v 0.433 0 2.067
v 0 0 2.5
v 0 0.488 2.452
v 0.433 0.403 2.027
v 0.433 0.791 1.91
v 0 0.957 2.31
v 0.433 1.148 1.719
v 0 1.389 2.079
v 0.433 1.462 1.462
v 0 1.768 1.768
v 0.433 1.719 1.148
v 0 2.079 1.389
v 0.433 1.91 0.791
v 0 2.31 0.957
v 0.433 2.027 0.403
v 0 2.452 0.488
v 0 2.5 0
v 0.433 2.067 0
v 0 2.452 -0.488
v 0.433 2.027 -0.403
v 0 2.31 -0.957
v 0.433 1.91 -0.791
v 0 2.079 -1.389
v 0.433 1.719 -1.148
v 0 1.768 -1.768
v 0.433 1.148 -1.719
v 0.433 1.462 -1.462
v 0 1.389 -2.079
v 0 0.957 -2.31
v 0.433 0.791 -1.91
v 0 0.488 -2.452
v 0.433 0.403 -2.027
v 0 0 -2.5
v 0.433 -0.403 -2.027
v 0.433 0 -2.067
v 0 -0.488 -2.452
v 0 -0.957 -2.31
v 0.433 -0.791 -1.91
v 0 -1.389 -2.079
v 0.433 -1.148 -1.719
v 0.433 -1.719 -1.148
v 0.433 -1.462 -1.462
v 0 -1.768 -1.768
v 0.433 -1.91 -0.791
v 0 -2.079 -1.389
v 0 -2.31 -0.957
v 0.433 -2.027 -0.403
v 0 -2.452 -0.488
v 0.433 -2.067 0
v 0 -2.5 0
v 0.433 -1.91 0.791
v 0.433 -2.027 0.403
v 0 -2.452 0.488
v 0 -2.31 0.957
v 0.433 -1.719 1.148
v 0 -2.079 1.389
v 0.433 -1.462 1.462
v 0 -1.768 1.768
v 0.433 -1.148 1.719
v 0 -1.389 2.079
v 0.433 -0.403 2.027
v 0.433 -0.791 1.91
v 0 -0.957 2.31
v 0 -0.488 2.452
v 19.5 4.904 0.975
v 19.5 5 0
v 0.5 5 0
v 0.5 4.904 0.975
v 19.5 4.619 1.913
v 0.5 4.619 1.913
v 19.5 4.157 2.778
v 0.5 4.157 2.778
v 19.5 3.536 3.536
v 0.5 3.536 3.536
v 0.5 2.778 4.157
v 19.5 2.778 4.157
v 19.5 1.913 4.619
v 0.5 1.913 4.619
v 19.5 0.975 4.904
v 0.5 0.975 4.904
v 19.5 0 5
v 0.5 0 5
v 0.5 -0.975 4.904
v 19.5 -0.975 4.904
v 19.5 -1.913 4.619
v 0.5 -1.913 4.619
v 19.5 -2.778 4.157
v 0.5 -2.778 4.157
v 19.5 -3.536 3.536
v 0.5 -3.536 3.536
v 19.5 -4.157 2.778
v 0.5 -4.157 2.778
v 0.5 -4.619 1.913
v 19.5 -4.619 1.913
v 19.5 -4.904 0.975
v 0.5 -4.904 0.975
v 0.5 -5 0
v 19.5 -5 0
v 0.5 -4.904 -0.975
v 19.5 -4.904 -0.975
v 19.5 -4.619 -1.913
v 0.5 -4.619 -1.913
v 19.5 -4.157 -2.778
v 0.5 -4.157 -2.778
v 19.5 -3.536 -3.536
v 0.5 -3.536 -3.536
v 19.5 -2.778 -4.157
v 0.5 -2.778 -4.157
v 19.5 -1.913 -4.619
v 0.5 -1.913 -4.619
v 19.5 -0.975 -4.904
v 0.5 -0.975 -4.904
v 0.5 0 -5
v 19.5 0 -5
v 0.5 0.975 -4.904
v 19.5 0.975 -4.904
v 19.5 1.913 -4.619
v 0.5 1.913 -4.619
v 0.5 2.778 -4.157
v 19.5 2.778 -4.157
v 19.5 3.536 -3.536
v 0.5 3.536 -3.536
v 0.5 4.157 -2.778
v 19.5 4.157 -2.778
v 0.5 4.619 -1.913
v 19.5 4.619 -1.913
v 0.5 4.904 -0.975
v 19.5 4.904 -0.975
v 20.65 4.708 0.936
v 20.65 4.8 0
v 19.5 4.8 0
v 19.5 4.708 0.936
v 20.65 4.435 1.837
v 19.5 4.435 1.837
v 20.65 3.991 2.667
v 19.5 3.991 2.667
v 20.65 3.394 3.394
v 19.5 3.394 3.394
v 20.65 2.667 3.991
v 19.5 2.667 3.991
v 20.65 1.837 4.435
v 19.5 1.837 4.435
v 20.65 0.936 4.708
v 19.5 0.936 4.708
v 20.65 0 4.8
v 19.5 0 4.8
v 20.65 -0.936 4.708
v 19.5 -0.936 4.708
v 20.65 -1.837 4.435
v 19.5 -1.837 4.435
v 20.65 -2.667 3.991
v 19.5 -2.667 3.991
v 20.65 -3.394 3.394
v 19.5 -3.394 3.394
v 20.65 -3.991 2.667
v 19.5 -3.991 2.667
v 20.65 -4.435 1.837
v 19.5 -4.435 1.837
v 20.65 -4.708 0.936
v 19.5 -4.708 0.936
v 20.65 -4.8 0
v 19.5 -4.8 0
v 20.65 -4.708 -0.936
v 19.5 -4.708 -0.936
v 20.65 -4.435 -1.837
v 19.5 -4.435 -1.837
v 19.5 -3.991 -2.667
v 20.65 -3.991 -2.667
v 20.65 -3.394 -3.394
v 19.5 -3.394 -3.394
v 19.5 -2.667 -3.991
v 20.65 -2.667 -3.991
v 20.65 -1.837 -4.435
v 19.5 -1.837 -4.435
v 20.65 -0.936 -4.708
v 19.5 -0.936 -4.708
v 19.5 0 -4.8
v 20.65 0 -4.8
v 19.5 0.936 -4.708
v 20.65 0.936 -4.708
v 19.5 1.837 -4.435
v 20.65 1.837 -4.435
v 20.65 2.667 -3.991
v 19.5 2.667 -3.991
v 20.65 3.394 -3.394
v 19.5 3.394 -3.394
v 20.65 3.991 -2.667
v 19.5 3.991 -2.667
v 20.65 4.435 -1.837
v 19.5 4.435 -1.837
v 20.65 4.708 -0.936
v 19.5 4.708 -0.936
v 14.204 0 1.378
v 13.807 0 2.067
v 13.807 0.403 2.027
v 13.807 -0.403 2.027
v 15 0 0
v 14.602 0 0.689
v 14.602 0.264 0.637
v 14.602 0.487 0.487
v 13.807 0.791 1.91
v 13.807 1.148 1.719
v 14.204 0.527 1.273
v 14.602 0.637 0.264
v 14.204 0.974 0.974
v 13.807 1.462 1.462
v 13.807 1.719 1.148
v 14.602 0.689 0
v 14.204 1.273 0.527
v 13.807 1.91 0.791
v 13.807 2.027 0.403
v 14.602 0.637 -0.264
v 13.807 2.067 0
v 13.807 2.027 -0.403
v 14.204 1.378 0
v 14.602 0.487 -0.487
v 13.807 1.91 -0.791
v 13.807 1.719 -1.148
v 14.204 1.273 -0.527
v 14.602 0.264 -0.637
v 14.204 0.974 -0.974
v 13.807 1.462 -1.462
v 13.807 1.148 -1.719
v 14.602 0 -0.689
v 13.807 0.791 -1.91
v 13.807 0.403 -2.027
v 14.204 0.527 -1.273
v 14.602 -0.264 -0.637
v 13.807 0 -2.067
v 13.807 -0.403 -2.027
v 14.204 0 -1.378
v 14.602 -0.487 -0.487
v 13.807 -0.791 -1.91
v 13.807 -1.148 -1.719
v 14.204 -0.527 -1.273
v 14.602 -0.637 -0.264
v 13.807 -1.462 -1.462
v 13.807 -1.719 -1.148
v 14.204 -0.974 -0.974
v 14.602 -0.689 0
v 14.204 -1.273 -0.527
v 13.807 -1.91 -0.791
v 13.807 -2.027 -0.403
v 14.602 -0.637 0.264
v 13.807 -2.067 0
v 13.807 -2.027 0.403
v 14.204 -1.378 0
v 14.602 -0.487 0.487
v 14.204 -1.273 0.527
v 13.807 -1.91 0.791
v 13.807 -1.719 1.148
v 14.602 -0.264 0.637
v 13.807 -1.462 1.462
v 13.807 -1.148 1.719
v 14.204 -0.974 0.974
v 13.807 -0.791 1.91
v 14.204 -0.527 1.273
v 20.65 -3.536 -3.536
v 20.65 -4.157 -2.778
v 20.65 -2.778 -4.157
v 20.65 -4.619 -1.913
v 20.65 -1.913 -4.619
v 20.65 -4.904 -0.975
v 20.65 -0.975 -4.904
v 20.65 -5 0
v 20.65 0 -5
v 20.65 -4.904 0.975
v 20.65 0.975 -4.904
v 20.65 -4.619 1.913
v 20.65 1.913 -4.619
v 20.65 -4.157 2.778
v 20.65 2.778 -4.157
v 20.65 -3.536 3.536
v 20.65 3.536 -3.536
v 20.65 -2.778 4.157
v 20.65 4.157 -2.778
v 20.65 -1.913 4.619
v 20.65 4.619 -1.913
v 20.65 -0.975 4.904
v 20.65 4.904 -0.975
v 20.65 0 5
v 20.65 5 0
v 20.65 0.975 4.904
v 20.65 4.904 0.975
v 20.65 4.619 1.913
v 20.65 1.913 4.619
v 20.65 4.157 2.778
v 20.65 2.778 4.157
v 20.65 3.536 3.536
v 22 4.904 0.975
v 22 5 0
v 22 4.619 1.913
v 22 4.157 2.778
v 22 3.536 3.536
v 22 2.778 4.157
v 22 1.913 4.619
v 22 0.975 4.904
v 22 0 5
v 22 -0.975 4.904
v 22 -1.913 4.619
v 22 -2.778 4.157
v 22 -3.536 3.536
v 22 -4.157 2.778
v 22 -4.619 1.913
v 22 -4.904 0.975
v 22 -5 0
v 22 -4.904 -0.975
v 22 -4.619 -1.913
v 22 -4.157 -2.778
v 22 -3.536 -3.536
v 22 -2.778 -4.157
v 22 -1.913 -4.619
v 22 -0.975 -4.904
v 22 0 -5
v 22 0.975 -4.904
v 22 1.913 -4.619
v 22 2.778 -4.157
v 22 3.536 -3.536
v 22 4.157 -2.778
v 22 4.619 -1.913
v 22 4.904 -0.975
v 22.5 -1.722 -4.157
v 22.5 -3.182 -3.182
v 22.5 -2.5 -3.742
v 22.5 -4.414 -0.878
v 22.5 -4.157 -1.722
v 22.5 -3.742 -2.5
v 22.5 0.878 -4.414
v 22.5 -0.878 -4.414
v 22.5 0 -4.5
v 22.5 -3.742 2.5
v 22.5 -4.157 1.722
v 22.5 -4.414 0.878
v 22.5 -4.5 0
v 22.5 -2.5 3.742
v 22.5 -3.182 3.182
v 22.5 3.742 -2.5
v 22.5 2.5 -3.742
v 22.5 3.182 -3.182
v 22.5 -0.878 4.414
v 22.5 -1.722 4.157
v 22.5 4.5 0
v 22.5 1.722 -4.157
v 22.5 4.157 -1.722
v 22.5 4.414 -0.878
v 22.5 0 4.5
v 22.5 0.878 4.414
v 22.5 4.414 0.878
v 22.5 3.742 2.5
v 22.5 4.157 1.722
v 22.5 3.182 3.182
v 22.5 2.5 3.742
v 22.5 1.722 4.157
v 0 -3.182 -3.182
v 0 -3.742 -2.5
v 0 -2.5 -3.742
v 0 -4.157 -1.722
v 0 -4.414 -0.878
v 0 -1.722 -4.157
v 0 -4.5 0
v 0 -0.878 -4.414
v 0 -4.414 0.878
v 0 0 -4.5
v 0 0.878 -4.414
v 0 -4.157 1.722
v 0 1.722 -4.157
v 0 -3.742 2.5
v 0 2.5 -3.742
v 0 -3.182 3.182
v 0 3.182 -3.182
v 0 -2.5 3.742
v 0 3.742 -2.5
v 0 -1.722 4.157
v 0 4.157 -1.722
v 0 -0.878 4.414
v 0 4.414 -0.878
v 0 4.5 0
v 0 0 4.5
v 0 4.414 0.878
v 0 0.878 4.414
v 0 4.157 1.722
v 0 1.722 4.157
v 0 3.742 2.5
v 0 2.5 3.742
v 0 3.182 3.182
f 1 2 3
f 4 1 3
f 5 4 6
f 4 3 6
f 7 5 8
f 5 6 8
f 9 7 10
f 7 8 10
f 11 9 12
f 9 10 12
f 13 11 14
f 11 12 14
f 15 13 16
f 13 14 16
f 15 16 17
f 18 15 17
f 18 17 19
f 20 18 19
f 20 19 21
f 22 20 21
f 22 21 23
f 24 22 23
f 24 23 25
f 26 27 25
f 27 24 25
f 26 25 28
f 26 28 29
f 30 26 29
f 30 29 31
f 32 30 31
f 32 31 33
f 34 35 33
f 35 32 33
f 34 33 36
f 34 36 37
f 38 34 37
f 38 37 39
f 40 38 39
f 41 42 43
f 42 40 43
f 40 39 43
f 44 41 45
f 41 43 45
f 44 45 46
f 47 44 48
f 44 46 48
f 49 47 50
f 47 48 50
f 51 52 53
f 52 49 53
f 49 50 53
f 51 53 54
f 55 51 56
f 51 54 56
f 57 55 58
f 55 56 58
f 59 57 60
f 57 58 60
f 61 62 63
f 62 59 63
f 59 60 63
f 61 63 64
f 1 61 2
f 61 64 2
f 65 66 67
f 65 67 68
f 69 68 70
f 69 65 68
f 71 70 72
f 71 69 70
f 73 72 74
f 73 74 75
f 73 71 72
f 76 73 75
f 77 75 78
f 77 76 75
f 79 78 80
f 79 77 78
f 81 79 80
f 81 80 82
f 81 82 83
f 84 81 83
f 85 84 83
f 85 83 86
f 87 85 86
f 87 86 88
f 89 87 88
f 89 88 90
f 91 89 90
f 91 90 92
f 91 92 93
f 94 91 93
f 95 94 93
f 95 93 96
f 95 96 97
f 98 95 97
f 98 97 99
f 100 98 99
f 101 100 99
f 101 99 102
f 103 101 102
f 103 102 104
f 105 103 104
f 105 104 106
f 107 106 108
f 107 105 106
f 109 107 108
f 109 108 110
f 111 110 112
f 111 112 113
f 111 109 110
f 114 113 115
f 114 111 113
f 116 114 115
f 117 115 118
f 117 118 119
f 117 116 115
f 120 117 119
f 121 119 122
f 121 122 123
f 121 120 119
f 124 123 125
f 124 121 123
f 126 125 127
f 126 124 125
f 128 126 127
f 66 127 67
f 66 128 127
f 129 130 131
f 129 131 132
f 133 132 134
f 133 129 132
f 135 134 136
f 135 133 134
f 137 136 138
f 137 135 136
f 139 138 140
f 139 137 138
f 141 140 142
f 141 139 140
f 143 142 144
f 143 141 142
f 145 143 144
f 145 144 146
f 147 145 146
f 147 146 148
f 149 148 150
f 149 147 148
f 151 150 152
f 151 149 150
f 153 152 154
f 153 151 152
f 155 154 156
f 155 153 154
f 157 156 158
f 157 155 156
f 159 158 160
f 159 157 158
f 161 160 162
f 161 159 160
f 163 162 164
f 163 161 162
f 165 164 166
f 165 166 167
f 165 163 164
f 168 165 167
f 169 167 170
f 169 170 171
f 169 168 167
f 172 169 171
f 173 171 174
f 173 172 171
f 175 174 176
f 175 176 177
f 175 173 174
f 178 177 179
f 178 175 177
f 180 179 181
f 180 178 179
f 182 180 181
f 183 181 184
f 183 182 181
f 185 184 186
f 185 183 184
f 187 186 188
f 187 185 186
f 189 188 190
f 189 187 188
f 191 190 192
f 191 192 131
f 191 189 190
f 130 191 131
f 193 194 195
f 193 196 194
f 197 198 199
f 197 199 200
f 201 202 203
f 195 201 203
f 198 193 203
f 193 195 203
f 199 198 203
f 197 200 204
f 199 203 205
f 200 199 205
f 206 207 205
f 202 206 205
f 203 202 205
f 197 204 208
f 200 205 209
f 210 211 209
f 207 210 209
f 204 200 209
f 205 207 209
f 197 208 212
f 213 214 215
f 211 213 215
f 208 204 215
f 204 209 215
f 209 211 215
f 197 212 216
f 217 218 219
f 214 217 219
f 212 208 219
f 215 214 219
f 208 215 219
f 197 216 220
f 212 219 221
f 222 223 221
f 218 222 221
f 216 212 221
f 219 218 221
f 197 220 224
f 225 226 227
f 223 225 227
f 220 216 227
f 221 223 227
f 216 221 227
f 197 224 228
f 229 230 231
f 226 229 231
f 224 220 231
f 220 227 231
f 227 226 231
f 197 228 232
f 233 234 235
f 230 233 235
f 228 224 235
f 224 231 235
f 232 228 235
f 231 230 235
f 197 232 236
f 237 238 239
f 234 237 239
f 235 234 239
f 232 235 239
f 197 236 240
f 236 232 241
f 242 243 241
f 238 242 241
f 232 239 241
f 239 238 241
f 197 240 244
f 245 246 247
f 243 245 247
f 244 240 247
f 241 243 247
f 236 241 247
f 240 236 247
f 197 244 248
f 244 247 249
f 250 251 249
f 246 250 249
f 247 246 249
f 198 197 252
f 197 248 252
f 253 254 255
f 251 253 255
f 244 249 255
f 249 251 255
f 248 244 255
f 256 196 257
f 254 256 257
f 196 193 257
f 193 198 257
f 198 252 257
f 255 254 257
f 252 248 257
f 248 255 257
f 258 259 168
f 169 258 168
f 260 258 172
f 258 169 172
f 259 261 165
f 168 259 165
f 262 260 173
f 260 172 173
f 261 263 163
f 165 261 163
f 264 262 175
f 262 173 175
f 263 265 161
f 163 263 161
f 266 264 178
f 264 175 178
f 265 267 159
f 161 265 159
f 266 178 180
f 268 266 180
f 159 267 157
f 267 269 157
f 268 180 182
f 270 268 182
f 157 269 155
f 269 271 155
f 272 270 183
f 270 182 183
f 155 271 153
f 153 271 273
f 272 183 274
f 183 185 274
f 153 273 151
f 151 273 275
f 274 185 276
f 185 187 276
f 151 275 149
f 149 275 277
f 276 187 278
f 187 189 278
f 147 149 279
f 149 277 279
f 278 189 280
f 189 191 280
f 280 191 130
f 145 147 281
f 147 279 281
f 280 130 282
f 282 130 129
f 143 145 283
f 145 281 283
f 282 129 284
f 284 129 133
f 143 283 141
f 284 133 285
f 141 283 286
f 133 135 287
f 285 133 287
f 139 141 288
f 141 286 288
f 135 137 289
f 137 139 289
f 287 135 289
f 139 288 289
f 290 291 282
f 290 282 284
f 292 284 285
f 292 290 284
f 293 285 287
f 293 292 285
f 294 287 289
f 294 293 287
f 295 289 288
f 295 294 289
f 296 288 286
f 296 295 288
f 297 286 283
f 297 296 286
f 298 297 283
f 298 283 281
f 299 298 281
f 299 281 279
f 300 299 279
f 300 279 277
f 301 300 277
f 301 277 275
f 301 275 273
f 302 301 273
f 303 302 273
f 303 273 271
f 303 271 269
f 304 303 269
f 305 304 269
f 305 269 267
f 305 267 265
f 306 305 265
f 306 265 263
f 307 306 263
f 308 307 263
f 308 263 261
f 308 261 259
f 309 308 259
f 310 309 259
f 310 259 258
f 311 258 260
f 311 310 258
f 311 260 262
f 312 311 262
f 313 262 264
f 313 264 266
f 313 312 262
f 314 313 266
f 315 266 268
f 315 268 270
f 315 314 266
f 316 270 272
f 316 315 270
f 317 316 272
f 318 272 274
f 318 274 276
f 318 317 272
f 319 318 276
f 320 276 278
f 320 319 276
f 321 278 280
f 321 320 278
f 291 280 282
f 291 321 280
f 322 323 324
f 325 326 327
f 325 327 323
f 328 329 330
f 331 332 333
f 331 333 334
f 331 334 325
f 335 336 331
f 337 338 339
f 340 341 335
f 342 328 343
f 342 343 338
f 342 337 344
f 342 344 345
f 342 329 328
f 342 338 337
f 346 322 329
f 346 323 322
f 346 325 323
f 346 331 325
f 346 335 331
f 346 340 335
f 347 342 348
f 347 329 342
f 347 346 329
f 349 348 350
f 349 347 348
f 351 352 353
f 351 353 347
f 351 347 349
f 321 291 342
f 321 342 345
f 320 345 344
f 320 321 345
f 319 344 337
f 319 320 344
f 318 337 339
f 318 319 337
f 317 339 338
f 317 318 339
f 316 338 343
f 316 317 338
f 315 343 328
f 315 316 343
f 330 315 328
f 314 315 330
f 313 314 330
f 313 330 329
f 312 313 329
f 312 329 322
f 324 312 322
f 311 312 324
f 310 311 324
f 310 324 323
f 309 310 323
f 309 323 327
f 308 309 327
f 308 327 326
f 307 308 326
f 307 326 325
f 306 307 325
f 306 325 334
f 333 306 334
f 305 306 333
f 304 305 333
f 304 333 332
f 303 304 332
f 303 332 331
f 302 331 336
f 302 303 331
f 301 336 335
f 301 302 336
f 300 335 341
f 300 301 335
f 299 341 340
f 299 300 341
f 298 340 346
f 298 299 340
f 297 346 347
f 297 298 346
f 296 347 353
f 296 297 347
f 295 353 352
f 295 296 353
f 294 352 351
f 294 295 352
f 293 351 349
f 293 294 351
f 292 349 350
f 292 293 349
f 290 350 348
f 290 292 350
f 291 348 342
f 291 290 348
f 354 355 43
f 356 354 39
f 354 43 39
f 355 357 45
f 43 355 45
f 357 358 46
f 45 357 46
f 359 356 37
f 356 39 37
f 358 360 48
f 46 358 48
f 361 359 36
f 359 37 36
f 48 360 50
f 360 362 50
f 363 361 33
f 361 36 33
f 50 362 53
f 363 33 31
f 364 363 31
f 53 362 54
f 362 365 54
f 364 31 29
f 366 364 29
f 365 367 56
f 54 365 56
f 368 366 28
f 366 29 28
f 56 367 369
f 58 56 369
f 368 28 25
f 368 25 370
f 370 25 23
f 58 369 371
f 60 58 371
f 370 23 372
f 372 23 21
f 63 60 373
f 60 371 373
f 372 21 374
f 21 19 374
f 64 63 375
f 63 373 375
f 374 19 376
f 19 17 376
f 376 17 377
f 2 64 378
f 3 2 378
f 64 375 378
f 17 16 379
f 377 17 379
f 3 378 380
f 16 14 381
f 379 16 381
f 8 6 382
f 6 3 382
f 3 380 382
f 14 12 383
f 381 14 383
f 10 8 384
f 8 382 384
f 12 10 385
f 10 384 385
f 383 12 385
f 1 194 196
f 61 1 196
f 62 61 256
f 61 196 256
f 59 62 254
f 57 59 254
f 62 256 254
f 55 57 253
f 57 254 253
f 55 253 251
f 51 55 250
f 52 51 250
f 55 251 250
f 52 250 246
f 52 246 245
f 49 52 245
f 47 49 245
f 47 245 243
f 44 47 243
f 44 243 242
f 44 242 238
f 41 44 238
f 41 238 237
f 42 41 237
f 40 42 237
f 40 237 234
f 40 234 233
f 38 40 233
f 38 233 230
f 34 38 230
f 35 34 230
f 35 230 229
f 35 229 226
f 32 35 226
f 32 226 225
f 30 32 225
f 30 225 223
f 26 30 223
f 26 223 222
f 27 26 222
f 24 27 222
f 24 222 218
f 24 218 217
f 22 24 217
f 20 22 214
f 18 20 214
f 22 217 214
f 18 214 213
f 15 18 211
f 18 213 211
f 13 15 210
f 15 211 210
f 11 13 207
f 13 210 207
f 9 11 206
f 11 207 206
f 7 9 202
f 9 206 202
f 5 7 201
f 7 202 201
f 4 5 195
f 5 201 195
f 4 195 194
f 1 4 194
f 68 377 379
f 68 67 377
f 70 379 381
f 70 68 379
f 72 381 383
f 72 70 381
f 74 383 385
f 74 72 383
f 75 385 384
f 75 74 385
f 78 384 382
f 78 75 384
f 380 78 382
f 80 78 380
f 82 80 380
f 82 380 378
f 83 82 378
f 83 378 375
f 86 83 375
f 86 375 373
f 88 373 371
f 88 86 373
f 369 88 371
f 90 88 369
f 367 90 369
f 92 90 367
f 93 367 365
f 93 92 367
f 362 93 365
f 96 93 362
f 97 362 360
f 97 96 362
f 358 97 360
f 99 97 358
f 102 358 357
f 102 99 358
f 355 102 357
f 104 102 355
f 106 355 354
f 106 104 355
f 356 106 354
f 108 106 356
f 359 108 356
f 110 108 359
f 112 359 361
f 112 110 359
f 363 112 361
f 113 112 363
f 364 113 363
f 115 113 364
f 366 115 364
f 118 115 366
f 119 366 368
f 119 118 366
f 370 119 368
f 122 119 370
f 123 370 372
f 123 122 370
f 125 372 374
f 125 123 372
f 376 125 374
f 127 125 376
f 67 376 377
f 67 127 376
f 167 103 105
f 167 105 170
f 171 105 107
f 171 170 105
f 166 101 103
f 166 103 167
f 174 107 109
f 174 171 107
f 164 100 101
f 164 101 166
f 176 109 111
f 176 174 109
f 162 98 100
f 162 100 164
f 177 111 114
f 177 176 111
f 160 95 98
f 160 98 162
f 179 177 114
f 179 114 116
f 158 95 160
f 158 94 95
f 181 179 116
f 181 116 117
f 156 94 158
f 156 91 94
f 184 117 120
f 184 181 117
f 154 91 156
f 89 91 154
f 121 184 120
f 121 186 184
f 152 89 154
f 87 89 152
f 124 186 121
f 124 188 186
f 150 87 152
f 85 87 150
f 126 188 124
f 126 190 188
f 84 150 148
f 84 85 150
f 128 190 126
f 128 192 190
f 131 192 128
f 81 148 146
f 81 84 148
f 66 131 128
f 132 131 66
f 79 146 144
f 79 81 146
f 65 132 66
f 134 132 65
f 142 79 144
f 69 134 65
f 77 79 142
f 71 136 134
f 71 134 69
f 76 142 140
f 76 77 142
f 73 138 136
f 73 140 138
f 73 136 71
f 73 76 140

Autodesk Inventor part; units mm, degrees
sketch "Sketch_1" plane through (0, 0, 0) normal (0, 0, 1) x (1, 0, 0)
  line L0 (22.5, 0) -> (0, 0)
  line L1 (0, 0) -> (0, 4.5)
  line L2 (0, 4.5) -> (0.5, 5)
  line L3 (0.5, 5) -> (22, 5)
  line L4 (22, 5) -> (22.5, 4.5)
  line L5 (22.5, 4.5) -> (22.5, 0)
  line L6 (22.5, 0) -> (0, 0)
revolve "Revolution1" add sketch "Sketch_1" angle 360 about axis through (22.5, 0, 0) along (1, 0, 0)
sketch "Sketch2" plane through (0, 0, 0) normal (-1, 0, 0) x (0, 0, 1)
  point P0 (0, 0)
hole "Hole1" at (0, 0, 0) direction (1, 0, 0) diameter 4.134 depth 13.8066 tip angle 120 countersink diameter 5 countersink angle 90 thread size "M5x0.8" class "6H" standard "ISO Metric profile"
sketch "Sketch_20" plane through (0, 0, 0) normal (0, 0, 1) x (1, 0, 0)
  line L0 (22.5, 0) -> (-22.5, 0)
  line L1 (19.5, 9.6) -> (19.5, 4.8)
  line L2 (19.5, 4.8) -> (20.65, 4.8)
  line L3 (20.65, 4.8) -> (20.65, 9.6)
  line L4 (20.65, 9.6) -> (19.5, 9.6)
revolve "Revolution2" cut sketch "Sketch_20" angle 360 about axis through (22.5, 0, 0) along (1, 0, 0)
ref_plane "to_ring_F_R_XY" through (20.075, 0, 0) normal (1, 0, 0) x (0, 0, -1)
ref_plane "to_ring_F_R_YZ" through (20.075, 0, 0) normal (0, 0, -1) x (0, 1, 0)
ref_plane "to_ring_F_R_ZX" through (20.075, 0, 0) normal (0, 1, 0) x (1, 0, 0)
properties part number "SSFRBF-D10-L22.5-M5-U3"
